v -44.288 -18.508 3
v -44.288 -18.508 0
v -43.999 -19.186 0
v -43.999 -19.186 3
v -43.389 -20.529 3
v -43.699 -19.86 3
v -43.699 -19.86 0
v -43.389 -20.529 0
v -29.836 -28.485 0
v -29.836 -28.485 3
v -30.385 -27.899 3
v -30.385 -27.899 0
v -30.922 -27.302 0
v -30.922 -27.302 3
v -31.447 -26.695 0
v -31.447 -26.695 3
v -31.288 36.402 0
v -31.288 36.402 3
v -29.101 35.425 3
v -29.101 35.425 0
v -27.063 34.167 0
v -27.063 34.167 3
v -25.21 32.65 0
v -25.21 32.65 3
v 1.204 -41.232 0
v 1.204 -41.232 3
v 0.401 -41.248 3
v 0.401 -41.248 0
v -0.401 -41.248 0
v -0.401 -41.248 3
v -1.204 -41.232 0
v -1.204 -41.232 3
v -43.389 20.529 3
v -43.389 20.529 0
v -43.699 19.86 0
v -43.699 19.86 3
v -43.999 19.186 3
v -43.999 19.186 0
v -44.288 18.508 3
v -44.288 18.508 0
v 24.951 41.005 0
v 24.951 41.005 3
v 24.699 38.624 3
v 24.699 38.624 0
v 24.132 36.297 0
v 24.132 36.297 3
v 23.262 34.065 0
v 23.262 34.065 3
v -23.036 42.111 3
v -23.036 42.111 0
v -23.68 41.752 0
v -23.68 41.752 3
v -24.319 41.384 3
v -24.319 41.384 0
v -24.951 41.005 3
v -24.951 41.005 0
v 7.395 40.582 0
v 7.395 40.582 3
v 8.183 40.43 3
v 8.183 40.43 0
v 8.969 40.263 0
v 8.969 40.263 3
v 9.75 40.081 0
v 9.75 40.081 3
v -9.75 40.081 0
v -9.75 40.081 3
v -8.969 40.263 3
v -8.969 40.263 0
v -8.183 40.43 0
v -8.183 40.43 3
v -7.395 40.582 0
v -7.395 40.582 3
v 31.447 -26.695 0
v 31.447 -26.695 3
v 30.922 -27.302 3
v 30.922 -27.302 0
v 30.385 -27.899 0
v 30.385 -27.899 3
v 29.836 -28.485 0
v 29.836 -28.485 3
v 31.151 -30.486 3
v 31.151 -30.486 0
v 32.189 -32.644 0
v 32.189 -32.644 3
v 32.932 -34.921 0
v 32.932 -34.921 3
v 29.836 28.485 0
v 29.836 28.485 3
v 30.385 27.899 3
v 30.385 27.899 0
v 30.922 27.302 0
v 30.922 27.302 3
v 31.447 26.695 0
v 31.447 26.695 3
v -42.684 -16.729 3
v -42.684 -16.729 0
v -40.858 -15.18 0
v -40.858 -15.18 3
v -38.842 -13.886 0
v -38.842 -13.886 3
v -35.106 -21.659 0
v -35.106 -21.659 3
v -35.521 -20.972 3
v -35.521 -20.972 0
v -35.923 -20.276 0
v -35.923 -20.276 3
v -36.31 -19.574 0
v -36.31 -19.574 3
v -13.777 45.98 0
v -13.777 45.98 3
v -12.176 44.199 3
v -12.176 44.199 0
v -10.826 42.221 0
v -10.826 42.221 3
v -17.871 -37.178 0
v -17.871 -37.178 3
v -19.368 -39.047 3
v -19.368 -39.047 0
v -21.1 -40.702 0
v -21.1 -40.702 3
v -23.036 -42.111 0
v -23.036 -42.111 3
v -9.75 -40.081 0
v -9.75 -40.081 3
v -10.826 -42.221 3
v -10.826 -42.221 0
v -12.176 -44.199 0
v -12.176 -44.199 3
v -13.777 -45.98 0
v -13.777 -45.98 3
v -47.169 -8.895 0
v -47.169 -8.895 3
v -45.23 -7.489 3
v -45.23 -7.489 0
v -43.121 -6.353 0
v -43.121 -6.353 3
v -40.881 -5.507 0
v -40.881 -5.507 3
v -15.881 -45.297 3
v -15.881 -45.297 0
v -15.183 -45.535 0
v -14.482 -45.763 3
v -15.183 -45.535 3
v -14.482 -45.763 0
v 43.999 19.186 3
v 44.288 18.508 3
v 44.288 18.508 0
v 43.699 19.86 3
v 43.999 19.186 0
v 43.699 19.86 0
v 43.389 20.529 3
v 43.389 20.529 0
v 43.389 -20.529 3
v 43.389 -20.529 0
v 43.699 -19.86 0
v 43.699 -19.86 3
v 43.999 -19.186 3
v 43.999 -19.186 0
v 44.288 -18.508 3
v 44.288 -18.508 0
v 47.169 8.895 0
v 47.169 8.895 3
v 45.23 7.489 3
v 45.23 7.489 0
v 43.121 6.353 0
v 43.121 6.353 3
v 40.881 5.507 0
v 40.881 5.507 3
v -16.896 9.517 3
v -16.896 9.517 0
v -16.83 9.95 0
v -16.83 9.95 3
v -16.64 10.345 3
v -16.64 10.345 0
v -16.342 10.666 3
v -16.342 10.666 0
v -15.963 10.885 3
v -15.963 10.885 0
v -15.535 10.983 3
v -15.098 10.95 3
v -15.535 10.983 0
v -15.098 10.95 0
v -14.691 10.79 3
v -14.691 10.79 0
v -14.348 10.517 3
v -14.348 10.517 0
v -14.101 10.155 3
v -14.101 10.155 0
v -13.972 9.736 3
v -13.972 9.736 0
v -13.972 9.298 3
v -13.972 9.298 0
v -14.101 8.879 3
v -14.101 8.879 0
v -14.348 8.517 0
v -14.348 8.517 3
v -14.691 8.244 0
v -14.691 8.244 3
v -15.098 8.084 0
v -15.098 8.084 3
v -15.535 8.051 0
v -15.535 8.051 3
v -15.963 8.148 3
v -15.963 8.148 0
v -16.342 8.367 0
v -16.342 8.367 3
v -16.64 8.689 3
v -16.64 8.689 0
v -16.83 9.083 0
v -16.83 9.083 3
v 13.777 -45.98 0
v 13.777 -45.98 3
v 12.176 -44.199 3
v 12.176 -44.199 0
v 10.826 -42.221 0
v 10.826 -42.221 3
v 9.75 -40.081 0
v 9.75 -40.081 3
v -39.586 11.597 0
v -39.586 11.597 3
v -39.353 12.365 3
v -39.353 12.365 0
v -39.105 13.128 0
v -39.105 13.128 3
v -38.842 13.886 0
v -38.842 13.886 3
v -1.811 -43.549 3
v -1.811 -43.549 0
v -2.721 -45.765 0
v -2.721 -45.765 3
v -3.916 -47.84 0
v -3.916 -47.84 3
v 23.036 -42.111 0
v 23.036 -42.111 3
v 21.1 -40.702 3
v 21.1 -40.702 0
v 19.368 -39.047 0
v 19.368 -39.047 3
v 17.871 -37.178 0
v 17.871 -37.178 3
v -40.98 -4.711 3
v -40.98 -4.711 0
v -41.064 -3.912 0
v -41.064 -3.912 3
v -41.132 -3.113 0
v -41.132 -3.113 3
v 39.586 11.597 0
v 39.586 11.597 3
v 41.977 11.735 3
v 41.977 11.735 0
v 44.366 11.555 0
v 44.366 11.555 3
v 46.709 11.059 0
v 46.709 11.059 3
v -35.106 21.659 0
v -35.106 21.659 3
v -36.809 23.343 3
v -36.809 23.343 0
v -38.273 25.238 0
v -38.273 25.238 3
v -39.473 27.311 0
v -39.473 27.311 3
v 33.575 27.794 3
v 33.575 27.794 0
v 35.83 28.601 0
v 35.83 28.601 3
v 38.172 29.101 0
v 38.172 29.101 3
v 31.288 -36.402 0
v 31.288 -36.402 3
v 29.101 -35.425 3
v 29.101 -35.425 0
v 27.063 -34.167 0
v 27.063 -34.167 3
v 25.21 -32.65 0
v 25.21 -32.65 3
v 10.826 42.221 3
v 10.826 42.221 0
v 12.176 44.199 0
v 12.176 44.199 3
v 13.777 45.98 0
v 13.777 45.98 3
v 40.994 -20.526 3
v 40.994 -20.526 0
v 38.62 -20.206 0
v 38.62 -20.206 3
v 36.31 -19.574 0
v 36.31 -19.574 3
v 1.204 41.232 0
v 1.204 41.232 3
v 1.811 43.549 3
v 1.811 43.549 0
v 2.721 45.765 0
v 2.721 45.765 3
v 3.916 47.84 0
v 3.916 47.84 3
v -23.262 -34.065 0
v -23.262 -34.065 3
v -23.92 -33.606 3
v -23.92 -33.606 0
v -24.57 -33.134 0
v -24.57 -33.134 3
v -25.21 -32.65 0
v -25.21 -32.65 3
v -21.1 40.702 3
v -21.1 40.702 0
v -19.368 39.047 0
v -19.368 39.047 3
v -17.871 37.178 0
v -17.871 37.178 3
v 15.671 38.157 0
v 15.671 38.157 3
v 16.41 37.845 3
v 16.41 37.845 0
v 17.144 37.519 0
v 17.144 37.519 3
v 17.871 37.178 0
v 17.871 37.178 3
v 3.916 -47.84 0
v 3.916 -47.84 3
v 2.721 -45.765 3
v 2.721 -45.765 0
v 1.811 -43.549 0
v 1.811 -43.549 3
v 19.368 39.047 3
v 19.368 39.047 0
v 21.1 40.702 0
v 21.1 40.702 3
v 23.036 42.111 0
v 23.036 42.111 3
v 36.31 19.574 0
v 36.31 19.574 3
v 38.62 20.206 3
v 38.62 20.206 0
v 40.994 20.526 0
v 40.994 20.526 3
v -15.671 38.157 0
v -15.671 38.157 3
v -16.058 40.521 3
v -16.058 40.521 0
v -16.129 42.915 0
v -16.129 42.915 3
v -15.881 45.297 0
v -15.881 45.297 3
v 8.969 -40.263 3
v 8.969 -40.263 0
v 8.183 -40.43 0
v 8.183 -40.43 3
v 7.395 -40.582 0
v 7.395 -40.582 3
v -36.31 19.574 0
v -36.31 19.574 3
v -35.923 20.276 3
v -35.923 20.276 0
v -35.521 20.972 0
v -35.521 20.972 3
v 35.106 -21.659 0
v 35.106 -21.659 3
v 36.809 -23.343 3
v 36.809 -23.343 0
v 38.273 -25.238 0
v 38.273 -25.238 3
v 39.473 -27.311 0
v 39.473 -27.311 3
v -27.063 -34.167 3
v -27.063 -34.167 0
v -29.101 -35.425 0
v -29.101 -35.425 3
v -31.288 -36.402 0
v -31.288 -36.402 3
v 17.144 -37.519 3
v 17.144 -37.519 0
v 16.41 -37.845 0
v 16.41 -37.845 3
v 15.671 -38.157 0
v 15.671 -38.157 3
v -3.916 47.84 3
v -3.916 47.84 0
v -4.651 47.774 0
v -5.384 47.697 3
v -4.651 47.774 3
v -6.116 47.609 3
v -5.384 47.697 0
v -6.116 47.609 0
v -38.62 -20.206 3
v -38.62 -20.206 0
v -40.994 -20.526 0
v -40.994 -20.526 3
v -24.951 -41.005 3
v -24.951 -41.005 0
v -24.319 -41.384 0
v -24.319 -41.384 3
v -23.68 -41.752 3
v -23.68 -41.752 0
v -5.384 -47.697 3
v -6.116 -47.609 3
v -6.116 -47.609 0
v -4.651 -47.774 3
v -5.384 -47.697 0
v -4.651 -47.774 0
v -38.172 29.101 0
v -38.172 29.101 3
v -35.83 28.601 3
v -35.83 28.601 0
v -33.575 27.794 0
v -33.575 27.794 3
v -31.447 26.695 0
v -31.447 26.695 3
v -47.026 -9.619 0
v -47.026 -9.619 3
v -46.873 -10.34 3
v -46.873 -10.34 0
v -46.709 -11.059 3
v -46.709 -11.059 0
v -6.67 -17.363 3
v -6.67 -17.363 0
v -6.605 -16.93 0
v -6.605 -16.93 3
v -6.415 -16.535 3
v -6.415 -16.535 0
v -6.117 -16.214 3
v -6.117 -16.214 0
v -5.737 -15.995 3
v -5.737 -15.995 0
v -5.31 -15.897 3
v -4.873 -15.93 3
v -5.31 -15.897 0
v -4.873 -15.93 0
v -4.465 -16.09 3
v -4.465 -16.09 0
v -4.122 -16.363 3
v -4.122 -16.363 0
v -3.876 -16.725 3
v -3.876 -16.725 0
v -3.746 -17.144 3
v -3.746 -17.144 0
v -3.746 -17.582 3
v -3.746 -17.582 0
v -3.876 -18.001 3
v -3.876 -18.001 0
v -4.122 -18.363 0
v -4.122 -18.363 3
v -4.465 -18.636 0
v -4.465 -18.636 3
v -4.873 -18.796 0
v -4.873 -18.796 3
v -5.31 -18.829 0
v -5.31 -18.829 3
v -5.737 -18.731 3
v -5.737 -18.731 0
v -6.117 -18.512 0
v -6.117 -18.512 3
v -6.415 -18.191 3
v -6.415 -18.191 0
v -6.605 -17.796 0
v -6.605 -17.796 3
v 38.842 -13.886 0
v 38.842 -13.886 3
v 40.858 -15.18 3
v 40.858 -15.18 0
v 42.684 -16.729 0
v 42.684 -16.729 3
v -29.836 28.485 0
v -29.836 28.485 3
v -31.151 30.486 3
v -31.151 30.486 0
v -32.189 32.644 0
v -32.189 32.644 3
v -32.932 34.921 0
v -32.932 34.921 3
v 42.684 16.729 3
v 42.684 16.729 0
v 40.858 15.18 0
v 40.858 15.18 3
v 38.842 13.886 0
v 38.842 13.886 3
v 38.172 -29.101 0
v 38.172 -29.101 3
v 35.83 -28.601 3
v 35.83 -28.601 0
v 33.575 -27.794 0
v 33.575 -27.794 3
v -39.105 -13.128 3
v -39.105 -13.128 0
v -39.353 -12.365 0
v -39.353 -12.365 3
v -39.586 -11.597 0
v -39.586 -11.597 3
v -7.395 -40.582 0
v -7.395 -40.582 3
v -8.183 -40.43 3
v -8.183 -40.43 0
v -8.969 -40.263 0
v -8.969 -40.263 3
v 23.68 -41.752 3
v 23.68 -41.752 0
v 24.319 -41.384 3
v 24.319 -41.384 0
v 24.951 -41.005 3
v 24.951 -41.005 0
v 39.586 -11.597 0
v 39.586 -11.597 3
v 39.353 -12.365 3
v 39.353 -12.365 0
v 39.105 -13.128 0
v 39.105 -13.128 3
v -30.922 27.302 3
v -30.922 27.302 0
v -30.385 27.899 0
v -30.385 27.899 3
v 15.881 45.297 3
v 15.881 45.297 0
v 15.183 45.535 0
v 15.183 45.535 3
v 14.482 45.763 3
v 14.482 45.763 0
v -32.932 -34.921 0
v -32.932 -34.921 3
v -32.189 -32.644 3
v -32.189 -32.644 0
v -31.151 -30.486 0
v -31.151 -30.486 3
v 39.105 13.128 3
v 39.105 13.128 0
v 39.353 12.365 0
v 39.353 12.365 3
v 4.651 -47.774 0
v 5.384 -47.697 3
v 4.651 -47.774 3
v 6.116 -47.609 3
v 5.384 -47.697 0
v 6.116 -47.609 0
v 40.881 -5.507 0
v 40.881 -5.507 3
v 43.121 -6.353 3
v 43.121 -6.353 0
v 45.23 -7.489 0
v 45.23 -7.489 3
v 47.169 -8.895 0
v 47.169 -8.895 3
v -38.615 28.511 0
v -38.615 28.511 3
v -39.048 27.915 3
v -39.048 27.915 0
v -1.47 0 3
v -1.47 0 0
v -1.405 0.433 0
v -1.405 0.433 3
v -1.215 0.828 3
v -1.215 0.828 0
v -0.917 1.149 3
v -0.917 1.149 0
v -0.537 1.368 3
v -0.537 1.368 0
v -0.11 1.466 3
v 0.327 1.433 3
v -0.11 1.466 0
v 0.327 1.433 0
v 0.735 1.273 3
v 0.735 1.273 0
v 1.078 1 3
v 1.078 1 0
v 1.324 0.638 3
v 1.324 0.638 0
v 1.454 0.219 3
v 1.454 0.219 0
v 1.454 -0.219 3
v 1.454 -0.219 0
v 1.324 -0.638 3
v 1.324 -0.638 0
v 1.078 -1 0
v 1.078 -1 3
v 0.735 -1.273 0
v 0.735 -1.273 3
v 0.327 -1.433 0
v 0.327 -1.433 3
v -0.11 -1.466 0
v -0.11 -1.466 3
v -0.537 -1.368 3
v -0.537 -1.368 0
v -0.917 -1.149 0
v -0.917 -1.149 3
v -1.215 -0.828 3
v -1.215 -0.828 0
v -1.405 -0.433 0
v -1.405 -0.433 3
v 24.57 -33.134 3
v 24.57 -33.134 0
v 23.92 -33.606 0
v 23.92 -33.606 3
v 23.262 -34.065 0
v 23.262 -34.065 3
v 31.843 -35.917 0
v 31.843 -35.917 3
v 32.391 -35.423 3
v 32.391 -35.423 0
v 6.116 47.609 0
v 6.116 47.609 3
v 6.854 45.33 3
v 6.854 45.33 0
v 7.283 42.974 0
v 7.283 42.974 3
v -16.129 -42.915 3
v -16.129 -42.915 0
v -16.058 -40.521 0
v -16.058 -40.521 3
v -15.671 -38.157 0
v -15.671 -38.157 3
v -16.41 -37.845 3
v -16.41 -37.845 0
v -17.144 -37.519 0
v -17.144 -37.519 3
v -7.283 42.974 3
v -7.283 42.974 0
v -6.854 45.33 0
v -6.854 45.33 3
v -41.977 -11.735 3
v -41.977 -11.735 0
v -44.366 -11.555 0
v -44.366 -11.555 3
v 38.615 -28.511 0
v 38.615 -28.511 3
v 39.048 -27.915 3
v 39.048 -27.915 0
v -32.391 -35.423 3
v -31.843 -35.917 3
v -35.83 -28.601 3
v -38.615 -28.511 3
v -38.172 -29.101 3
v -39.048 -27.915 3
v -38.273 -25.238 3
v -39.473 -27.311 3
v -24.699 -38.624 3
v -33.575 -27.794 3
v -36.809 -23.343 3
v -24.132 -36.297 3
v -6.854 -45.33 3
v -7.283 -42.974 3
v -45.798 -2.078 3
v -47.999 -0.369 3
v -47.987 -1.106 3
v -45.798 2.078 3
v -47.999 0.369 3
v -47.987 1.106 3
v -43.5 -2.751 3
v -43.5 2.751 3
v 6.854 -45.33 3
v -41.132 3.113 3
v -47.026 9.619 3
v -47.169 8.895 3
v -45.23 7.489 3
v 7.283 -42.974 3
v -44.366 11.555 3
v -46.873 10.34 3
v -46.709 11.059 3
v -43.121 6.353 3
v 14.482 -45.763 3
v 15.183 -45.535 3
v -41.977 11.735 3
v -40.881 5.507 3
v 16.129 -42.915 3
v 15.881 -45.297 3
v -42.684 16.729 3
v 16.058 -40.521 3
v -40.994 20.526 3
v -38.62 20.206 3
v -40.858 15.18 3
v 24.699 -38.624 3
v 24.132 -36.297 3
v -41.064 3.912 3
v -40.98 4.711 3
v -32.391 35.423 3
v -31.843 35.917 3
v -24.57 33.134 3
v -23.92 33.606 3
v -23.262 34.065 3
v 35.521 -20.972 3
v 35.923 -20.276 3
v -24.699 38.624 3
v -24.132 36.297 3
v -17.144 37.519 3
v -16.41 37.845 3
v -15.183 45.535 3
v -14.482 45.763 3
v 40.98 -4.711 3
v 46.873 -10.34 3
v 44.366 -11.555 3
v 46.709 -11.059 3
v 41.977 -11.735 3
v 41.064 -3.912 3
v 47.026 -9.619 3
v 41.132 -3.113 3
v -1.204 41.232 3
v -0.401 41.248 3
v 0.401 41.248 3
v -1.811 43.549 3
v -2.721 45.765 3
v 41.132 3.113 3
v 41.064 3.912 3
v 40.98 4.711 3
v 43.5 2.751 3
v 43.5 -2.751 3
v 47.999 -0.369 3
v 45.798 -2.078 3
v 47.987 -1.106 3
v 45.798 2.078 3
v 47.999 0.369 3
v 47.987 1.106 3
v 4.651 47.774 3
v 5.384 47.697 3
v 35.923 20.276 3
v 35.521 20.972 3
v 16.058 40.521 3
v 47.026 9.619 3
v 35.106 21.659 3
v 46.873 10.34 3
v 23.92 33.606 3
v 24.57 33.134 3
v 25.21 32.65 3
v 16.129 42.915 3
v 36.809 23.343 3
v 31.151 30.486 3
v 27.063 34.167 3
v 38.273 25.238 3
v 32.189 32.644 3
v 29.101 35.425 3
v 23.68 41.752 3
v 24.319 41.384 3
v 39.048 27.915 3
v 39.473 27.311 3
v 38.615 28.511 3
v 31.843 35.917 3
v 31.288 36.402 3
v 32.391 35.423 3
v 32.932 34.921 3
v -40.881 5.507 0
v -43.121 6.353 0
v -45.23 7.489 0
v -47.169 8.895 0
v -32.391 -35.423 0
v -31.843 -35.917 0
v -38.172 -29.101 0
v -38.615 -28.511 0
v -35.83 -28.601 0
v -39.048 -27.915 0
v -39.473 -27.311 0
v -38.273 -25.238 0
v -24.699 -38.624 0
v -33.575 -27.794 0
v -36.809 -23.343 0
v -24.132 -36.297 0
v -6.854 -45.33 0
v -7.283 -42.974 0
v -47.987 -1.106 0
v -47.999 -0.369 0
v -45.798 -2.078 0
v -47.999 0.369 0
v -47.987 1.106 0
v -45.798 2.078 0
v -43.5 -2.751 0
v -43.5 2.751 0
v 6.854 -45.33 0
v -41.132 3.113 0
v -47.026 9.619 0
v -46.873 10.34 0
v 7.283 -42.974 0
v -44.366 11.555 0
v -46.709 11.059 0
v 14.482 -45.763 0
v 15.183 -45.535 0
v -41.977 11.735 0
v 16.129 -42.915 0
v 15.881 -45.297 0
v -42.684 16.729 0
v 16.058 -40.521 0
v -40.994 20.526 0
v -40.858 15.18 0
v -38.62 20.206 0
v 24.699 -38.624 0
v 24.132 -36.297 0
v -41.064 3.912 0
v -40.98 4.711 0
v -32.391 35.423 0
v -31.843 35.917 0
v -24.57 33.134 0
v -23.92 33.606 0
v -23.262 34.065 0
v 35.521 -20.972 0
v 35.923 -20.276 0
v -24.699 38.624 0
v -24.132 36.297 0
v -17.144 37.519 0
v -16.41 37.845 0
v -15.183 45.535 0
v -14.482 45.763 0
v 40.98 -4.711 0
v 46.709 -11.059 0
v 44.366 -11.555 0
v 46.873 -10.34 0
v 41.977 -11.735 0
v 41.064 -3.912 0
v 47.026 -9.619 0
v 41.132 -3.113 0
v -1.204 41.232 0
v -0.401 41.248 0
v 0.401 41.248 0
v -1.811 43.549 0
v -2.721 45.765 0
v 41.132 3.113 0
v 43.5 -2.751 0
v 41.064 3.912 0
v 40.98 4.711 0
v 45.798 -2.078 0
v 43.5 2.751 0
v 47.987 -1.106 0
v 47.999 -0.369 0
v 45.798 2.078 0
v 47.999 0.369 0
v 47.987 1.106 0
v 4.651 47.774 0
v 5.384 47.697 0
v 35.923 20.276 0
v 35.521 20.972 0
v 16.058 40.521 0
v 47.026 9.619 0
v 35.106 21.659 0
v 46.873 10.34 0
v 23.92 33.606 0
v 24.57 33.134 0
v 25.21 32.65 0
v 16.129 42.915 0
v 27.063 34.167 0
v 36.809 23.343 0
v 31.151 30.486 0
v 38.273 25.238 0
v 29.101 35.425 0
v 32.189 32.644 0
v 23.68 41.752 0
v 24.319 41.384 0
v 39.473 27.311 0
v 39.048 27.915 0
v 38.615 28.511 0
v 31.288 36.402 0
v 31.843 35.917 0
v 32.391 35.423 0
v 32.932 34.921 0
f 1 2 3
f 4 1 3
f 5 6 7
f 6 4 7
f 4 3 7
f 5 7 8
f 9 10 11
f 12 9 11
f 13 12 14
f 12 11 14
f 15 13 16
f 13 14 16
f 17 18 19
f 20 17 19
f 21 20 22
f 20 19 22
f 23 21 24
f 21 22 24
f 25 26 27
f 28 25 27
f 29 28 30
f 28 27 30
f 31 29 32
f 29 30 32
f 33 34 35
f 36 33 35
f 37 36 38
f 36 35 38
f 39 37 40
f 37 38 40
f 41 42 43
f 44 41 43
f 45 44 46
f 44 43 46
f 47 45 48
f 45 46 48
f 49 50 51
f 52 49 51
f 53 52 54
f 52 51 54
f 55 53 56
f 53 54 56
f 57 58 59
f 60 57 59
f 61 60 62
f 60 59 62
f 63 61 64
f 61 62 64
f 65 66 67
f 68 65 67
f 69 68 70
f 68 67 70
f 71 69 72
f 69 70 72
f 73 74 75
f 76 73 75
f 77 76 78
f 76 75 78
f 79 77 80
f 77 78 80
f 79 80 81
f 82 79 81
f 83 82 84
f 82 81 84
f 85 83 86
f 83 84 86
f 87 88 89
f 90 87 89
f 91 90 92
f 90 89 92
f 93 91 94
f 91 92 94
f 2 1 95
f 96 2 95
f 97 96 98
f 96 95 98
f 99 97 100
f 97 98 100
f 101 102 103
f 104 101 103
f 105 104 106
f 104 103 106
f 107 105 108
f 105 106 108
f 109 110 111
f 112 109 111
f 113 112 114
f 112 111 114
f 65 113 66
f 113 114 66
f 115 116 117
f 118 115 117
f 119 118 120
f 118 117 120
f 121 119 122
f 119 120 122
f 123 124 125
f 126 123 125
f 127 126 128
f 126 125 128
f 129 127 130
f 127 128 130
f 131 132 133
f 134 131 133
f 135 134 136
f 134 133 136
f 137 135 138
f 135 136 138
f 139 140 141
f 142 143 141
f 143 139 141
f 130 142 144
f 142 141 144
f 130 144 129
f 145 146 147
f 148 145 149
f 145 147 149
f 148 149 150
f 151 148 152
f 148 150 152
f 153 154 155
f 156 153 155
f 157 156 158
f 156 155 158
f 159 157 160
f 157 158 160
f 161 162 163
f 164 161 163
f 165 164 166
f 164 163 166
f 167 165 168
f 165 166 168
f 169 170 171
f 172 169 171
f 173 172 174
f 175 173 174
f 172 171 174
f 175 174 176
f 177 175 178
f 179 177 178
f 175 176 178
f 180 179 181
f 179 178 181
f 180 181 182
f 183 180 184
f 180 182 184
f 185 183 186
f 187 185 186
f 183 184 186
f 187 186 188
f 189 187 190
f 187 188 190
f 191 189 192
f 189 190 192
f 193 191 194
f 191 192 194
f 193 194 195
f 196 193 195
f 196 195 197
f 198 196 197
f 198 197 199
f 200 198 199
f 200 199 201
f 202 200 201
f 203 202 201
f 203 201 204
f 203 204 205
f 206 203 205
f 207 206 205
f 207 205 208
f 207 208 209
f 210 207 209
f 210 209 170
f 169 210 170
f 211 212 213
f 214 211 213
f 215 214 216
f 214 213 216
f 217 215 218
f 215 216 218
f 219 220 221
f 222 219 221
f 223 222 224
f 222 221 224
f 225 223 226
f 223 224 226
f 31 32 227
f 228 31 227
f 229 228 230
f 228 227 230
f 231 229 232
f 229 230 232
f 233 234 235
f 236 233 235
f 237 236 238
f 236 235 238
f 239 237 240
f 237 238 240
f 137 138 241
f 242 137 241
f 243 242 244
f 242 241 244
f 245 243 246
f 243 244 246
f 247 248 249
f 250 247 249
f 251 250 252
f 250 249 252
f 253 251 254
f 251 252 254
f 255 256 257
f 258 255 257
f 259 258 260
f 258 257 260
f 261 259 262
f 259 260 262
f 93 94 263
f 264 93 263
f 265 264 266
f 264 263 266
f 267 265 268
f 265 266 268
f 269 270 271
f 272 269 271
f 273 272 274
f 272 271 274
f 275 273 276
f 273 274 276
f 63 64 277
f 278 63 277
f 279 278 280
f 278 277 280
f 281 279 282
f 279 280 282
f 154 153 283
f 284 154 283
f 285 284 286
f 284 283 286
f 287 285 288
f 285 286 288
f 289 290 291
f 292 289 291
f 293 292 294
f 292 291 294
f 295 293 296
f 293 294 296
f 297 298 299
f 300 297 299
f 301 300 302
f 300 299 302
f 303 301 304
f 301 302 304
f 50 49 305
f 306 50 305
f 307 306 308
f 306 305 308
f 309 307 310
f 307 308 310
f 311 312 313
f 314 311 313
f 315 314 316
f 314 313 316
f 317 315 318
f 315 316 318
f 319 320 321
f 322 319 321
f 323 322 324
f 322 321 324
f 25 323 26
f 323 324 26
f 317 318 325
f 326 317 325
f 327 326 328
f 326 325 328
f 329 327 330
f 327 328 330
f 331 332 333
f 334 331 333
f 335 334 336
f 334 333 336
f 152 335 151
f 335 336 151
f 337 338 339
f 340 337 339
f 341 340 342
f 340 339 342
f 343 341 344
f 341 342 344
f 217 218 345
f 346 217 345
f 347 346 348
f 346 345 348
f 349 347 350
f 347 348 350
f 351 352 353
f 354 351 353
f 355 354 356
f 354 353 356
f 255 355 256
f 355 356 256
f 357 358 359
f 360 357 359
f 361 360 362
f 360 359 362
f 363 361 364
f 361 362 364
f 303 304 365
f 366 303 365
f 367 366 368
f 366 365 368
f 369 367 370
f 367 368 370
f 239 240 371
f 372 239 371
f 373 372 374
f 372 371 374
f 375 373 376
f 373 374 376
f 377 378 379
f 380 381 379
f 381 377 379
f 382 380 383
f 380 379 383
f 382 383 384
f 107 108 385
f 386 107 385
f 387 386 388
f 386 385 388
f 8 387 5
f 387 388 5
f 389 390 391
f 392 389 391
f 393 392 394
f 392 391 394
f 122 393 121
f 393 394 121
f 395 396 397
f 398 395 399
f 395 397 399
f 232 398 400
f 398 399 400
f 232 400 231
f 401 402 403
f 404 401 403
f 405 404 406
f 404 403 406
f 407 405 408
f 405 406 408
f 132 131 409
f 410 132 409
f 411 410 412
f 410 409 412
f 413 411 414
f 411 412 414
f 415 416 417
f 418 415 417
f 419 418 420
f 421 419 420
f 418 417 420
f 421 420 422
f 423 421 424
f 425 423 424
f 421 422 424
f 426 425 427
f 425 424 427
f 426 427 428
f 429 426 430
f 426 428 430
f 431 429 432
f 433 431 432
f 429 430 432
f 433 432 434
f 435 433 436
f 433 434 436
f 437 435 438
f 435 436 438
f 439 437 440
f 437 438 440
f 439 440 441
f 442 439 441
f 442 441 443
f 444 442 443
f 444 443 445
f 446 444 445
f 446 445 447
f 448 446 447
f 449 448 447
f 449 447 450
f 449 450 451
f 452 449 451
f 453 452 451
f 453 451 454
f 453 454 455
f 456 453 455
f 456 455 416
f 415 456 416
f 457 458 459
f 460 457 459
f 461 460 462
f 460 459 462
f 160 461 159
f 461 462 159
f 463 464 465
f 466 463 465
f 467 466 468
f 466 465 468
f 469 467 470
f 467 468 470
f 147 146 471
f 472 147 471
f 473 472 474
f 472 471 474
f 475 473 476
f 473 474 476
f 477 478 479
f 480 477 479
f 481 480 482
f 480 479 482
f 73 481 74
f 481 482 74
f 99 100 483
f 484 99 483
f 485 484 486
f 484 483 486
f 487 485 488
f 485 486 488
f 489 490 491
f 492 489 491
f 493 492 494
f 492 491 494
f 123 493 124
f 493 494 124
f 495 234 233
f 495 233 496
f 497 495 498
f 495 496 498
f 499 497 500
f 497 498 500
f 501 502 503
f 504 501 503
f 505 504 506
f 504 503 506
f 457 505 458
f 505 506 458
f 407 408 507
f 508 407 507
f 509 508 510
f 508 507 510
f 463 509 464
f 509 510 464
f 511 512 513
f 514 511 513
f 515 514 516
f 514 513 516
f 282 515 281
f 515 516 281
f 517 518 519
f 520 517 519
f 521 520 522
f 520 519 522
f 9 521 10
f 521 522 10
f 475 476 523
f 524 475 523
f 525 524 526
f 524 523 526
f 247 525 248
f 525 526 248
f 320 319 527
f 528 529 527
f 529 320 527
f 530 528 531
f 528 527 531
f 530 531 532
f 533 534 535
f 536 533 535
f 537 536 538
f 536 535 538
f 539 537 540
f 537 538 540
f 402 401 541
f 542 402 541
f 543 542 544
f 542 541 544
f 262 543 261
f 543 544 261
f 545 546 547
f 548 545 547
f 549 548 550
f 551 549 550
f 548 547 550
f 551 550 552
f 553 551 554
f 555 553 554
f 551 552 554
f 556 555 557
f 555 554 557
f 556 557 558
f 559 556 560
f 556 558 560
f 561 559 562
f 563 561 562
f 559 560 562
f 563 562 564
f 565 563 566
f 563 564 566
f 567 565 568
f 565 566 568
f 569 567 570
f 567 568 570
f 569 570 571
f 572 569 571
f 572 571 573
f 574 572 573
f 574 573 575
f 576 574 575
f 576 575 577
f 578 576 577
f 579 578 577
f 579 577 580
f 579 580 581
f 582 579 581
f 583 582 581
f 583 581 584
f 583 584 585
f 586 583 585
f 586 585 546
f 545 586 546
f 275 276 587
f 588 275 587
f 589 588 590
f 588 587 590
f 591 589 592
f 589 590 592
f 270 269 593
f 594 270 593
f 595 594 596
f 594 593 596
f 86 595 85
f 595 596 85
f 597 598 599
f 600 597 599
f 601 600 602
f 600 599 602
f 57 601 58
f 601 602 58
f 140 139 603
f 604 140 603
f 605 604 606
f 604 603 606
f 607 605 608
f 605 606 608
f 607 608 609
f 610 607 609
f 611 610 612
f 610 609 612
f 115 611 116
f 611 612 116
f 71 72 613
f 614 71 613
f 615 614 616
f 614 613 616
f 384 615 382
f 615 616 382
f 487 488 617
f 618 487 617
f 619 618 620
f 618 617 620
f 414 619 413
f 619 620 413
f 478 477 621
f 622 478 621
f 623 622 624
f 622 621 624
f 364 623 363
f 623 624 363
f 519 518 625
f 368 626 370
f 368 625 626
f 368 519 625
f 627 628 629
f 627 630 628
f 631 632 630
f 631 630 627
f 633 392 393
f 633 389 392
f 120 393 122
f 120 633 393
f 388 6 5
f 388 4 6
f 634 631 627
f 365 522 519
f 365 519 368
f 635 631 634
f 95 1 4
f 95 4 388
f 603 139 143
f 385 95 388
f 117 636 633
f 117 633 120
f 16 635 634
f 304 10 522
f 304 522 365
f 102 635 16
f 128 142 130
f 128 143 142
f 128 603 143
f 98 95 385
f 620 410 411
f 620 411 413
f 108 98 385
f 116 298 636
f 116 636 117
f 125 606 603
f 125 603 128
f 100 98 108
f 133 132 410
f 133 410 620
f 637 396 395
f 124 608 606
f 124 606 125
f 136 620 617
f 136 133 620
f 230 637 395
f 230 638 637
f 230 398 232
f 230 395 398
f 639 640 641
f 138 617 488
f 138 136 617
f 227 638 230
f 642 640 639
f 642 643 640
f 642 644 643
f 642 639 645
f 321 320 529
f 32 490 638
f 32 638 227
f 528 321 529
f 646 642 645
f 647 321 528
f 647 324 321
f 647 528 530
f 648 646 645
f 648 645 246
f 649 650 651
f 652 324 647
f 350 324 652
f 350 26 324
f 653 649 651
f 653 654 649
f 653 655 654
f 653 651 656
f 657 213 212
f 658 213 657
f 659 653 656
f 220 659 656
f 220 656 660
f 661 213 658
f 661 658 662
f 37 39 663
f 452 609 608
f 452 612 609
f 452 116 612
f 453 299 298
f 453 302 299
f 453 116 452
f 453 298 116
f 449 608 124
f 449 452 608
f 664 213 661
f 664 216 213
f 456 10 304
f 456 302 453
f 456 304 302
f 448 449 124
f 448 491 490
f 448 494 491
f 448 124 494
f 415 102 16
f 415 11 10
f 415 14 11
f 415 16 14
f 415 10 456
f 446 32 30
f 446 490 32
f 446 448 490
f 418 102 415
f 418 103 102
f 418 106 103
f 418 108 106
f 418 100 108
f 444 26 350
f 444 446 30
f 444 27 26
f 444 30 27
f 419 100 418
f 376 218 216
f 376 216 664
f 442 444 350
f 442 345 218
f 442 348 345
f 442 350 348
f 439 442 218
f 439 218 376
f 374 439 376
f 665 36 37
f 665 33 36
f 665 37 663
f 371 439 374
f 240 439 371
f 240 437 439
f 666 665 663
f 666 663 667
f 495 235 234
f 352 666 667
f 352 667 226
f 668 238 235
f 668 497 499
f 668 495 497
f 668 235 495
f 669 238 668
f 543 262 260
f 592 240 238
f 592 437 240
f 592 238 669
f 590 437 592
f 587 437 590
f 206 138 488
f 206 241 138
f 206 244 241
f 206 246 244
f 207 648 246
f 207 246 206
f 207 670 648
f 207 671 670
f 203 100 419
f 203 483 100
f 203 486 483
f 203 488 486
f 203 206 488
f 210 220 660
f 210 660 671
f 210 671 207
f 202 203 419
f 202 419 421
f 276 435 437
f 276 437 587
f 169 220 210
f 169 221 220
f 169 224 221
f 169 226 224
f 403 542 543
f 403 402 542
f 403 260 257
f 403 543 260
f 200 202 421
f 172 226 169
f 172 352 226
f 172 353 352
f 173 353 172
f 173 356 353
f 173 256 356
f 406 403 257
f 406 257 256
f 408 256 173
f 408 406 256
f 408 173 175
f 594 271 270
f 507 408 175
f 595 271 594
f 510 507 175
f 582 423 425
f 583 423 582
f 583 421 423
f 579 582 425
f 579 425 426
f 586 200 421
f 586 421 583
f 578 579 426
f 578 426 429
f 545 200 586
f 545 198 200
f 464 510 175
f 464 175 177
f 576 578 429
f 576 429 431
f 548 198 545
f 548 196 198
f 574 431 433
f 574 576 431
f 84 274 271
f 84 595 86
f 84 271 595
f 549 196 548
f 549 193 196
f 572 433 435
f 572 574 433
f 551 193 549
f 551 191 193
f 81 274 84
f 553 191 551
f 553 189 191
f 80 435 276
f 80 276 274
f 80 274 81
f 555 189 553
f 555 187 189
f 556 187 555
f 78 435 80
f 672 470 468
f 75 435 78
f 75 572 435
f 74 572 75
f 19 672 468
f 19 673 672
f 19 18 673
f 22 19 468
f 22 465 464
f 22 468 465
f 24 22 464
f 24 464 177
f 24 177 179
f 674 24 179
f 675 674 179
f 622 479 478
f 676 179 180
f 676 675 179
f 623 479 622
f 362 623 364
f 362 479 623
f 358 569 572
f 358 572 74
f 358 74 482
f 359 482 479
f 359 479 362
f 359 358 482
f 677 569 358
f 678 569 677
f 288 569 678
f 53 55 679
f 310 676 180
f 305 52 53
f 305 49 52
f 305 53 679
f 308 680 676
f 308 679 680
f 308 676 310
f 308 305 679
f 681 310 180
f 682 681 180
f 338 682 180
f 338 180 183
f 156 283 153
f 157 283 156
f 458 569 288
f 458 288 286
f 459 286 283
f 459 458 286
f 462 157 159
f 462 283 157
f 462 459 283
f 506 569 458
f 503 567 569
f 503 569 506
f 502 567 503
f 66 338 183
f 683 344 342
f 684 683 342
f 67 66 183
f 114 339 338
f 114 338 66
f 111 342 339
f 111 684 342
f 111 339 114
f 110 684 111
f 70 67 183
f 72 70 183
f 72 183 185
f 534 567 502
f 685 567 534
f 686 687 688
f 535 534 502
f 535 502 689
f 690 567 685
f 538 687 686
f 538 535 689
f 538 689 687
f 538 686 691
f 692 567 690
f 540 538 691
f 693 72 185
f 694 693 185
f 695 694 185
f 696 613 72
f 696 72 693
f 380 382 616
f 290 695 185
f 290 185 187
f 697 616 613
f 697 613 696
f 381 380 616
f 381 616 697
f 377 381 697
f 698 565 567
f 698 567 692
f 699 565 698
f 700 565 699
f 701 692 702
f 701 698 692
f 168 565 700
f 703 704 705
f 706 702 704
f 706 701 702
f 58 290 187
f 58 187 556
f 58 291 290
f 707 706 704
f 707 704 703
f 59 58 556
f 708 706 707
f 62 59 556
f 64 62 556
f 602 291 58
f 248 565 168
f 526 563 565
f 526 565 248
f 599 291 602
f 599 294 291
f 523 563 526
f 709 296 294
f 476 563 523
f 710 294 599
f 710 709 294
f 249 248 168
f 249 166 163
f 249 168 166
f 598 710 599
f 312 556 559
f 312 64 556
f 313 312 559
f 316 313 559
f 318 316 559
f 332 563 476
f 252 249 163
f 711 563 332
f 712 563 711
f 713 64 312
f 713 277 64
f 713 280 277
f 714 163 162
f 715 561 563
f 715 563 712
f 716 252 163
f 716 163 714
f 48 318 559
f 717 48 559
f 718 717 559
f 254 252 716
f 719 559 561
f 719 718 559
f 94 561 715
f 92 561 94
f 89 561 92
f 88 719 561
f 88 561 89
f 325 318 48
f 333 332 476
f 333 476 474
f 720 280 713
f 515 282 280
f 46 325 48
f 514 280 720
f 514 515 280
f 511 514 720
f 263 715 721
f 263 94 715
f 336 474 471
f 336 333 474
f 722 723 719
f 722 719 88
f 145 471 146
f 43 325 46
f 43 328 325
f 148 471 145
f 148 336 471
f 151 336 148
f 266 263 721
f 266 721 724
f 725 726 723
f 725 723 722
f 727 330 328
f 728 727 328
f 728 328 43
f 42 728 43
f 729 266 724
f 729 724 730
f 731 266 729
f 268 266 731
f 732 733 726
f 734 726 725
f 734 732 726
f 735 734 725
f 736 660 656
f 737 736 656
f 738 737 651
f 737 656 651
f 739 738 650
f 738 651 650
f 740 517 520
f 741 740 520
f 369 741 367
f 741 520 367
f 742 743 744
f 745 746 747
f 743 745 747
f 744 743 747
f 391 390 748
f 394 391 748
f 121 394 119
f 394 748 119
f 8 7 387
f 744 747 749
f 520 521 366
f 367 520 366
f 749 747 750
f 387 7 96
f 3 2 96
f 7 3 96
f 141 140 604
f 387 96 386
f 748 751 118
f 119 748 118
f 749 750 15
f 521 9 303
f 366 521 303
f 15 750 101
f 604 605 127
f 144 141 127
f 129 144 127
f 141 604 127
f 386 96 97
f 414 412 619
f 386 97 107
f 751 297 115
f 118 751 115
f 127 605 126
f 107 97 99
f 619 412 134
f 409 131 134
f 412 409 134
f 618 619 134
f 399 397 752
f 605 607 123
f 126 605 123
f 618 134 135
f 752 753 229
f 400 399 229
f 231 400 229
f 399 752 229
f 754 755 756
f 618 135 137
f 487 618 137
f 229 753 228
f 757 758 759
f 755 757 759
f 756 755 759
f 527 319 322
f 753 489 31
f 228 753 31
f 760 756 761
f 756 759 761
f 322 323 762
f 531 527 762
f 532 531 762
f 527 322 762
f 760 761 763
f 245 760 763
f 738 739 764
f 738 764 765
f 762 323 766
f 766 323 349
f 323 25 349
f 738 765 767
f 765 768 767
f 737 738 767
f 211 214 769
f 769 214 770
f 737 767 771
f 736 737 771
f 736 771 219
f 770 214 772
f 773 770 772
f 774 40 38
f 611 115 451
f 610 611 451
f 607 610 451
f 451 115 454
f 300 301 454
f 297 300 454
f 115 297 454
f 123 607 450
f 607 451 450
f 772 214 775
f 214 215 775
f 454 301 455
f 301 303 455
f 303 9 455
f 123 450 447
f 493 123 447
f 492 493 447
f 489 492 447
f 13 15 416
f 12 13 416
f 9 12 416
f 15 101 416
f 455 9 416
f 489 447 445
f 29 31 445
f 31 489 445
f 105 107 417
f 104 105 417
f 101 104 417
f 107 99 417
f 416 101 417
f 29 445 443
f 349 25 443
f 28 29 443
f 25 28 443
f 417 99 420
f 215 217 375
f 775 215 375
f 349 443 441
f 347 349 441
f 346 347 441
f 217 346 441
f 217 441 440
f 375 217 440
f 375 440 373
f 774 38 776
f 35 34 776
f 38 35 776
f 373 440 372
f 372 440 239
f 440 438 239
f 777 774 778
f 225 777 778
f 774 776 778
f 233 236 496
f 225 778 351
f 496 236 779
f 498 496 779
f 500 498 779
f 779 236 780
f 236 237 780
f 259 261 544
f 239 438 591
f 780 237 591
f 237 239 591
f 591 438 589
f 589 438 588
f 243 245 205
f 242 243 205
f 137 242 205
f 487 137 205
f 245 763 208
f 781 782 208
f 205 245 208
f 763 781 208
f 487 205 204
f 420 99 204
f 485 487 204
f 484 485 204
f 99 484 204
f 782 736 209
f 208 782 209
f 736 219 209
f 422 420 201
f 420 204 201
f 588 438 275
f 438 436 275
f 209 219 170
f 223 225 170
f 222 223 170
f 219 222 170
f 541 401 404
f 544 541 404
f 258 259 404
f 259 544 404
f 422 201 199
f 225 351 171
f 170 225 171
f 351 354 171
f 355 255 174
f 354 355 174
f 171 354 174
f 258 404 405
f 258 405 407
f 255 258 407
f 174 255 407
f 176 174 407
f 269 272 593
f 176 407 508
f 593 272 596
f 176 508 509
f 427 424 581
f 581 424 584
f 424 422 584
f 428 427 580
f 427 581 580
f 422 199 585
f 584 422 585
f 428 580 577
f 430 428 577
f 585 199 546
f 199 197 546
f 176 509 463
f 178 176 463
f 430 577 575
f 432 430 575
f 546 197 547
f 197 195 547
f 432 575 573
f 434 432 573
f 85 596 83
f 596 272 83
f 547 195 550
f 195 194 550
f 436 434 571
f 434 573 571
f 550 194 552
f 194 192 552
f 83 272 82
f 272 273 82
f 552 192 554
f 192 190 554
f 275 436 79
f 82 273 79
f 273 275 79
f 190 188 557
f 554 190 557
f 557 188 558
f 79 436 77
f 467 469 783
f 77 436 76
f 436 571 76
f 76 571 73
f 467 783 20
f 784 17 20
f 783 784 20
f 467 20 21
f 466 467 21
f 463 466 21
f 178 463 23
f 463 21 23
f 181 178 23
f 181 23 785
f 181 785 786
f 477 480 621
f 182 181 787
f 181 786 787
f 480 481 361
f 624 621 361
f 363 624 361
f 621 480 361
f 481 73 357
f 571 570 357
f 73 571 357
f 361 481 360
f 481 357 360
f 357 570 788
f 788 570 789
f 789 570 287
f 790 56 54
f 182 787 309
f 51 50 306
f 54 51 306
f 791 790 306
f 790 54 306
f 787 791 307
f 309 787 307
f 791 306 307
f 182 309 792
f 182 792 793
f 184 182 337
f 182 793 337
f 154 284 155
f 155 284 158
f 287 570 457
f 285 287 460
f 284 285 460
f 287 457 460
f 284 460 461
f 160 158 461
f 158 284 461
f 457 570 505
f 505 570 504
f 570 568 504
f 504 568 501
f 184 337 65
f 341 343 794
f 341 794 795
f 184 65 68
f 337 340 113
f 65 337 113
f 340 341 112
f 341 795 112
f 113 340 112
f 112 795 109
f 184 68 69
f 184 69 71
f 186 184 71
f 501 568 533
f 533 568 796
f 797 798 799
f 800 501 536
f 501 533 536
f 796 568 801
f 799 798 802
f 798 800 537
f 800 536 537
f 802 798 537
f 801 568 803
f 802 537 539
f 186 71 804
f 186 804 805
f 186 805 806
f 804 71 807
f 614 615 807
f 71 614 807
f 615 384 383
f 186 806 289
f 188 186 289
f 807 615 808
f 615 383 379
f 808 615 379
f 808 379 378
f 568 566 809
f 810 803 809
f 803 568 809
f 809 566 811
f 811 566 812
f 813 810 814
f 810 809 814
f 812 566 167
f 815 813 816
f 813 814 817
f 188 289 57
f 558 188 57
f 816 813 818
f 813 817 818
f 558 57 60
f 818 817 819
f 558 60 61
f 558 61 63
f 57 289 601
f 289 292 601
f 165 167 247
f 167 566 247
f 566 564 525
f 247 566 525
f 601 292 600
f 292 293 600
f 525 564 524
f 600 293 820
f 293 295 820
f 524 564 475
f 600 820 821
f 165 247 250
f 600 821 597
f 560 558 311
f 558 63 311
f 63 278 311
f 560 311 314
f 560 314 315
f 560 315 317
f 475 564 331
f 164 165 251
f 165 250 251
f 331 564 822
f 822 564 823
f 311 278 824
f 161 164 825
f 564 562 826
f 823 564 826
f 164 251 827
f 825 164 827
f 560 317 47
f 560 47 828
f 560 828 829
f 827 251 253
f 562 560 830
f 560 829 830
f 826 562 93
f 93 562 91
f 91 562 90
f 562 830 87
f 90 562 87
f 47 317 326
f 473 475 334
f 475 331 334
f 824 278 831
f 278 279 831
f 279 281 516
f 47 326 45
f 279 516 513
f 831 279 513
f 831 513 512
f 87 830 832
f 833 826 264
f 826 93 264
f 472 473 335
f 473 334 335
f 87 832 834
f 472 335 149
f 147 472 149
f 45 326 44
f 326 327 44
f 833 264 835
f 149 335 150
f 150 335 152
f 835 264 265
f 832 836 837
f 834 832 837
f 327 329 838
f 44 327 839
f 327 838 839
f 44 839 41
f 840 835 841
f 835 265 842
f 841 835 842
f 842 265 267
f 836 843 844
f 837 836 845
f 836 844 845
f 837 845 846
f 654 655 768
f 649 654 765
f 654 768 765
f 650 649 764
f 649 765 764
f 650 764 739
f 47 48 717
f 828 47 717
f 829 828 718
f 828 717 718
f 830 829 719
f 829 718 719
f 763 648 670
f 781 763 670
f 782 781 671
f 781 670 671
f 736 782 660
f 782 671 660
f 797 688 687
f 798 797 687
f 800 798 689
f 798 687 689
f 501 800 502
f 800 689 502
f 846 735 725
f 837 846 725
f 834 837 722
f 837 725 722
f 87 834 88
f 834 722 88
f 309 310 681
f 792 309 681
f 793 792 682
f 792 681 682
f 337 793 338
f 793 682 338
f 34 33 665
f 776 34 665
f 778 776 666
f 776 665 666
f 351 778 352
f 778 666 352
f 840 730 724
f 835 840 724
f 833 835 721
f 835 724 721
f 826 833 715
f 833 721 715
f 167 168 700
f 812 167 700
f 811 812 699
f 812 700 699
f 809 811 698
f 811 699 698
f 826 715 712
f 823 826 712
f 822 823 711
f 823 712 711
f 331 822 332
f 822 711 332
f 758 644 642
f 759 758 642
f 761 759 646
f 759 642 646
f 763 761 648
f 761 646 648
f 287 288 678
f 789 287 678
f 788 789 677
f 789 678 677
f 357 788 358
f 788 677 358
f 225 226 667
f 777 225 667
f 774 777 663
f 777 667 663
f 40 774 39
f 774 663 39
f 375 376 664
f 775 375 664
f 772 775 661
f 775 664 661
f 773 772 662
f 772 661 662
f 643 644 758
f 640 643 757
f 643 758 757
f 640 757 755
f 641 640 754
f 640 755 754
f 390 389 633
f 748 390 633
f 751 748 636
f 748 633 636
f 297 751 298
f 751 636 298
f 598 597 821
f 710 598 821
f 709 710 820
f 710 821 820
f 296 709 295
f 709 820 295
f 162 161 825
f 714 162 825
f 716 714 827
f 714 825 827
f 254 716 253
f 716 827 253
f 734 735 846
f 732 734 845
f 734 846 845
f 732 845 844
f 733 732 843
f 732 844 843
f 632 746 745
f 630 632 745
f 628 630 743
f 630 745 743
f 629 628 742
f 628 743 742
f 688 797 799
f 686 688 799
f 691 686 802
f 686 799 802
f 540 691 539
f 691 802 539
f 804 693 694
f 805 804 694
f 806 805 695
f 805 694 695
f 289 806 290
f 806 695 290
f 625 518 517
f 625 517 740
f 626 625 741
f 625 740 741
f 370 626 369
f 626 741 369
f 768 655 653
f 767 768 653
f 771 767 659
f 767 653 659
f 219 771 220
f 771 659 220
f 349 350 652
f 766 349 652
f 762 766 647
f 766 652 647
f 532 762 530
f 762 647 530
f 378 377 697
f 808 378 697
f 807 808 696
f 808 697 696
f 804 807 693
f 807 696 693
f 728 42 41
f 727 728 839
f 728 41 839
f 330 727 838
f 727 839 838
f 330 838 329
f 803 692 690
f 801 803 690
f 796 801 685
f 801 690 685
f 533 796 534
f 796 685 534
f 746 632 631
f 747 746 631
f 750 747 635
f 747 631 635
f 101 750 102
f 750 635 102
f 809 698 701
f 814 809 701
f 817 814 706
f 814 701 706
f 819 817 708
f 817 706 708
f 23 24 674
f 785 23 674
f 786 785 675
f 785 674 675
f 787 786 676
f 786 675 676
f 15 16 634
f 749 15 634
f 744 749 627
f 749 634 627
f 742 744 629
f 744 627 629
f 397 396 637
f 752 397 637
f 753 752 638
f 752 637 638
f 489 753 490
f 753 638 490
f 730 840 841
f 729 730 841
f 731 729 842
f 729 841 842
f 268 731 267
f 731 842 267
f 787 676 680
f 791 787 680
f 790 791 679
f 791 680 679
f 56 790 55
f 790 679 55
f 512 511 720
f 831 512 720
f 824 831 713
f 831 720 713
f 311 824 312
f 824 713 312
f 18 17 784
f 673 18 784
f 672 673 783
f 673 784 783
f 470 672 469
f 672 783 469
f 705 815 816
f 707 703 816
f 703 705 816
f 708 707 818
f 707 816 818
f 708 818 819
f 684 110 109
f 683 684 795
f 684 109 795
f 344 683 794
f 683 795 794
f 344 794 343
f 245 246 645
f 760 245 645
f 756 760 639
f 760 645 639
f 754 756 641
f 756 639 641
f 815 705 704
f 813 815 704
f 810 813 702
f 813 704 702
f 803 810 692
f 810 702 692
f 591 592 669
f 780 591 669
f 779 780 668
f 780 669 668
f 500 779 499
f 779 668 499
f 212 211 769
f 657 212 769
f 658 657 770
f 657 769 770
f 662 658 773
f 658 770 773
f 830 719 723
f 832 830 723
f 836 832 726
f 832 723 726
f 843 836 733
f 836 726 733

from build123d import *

# Parameters (mm, degrees)
SKETCH1_R           = 48
BOSS_EXTRUDE1_DEPTH = 3
CUT_EXTRUDE1_DEPTH  = 68.948509917
CIRPATTERN1_COUNT   = 30
SKETCH7_R           = 1.47
CUT_EXTRUDE2_DEPTH  = 68.835567074
SKETCH8_R           = 1.47
CUT_EXTRUDE3_DEPTH  = 68.835567074


with BuildPart() as part:
    # Sketch1 → Boss-Extrude1 (new body)
    with BuildSketch(Plane.XY):
        Circle(SKETCH1_R)
    extrude(amount=BOSS_EXTRUDE1_DEPTH)

    # Sketch2 → Cut-Extrude1 (cut, through all)
    with BuildSketch(Plane.XY.offset(3)):
        with BuildLine():
            ThreePointArc((-1.20388032, 41.232428648), (0, 41.25), (1.20388032, 41.232428648))
            ThreePointArc((1.20388032, 41.232428648), (2.228958391, 44.672086233), (3.916100076, 47.839984952))
            ThreePointArc((3.916100076, 47.839984952), (0, 48), (-3.916100076, 47.839984952))
            ThreePointArc((-3.916100076, 47.839984952), (-2.228958391, 44.672086233), (-1.20388032, 41.232428648))
        make_face()
    cut_extrude1 = extrude(amount=-CUT_EXTRUDE1_DEPTH, mode=Mode.SUBTRACT)

    # CirPattern1: Cut-Extrude1 ×30 about axis
    cirpattern1_axis = Axis((0, 0, 0), (0, 0, 1))
    for i in range(1, CIRPATTERN1_COUNT):
        add(cut_extrude1.rotate(cirpattern1_axis, i * 360 / CIRPATTERN1_COUNT), mode=Mode.SUBTRACT)

    # Sketch7 → Cut-Extrude2 (cut, through all)
    with BuildSketch(Plane(origin=(0, 0, 0), x_dir=(-1, 0, 0), z_dir=(0, 0, -1))):
        Circle(SKETCH7_R)
    extrude(amount=-CUT_EXTRUDE2_DEPTH, mode=Mode.SUBTRACT)

    # Sketch8 → Cut-Extrude3 (cut, through all)
    with BuildSketch(Plane(origin=(0, 0, 0), x_dir=(-1, 0, 0), z_dir=(0, 0, -1))):
        with Locations((5.200050154, -17.363038426)):
            Circle(SKETCH8_R)
        with Locations((15.425535223, 9.516747768)):
            Circle(SKETCH8_R)
    extrude(amount=-CUT_EXTRUDE3_DEPTH, mode=Mode.SUBTRACT)


solid = part.part
